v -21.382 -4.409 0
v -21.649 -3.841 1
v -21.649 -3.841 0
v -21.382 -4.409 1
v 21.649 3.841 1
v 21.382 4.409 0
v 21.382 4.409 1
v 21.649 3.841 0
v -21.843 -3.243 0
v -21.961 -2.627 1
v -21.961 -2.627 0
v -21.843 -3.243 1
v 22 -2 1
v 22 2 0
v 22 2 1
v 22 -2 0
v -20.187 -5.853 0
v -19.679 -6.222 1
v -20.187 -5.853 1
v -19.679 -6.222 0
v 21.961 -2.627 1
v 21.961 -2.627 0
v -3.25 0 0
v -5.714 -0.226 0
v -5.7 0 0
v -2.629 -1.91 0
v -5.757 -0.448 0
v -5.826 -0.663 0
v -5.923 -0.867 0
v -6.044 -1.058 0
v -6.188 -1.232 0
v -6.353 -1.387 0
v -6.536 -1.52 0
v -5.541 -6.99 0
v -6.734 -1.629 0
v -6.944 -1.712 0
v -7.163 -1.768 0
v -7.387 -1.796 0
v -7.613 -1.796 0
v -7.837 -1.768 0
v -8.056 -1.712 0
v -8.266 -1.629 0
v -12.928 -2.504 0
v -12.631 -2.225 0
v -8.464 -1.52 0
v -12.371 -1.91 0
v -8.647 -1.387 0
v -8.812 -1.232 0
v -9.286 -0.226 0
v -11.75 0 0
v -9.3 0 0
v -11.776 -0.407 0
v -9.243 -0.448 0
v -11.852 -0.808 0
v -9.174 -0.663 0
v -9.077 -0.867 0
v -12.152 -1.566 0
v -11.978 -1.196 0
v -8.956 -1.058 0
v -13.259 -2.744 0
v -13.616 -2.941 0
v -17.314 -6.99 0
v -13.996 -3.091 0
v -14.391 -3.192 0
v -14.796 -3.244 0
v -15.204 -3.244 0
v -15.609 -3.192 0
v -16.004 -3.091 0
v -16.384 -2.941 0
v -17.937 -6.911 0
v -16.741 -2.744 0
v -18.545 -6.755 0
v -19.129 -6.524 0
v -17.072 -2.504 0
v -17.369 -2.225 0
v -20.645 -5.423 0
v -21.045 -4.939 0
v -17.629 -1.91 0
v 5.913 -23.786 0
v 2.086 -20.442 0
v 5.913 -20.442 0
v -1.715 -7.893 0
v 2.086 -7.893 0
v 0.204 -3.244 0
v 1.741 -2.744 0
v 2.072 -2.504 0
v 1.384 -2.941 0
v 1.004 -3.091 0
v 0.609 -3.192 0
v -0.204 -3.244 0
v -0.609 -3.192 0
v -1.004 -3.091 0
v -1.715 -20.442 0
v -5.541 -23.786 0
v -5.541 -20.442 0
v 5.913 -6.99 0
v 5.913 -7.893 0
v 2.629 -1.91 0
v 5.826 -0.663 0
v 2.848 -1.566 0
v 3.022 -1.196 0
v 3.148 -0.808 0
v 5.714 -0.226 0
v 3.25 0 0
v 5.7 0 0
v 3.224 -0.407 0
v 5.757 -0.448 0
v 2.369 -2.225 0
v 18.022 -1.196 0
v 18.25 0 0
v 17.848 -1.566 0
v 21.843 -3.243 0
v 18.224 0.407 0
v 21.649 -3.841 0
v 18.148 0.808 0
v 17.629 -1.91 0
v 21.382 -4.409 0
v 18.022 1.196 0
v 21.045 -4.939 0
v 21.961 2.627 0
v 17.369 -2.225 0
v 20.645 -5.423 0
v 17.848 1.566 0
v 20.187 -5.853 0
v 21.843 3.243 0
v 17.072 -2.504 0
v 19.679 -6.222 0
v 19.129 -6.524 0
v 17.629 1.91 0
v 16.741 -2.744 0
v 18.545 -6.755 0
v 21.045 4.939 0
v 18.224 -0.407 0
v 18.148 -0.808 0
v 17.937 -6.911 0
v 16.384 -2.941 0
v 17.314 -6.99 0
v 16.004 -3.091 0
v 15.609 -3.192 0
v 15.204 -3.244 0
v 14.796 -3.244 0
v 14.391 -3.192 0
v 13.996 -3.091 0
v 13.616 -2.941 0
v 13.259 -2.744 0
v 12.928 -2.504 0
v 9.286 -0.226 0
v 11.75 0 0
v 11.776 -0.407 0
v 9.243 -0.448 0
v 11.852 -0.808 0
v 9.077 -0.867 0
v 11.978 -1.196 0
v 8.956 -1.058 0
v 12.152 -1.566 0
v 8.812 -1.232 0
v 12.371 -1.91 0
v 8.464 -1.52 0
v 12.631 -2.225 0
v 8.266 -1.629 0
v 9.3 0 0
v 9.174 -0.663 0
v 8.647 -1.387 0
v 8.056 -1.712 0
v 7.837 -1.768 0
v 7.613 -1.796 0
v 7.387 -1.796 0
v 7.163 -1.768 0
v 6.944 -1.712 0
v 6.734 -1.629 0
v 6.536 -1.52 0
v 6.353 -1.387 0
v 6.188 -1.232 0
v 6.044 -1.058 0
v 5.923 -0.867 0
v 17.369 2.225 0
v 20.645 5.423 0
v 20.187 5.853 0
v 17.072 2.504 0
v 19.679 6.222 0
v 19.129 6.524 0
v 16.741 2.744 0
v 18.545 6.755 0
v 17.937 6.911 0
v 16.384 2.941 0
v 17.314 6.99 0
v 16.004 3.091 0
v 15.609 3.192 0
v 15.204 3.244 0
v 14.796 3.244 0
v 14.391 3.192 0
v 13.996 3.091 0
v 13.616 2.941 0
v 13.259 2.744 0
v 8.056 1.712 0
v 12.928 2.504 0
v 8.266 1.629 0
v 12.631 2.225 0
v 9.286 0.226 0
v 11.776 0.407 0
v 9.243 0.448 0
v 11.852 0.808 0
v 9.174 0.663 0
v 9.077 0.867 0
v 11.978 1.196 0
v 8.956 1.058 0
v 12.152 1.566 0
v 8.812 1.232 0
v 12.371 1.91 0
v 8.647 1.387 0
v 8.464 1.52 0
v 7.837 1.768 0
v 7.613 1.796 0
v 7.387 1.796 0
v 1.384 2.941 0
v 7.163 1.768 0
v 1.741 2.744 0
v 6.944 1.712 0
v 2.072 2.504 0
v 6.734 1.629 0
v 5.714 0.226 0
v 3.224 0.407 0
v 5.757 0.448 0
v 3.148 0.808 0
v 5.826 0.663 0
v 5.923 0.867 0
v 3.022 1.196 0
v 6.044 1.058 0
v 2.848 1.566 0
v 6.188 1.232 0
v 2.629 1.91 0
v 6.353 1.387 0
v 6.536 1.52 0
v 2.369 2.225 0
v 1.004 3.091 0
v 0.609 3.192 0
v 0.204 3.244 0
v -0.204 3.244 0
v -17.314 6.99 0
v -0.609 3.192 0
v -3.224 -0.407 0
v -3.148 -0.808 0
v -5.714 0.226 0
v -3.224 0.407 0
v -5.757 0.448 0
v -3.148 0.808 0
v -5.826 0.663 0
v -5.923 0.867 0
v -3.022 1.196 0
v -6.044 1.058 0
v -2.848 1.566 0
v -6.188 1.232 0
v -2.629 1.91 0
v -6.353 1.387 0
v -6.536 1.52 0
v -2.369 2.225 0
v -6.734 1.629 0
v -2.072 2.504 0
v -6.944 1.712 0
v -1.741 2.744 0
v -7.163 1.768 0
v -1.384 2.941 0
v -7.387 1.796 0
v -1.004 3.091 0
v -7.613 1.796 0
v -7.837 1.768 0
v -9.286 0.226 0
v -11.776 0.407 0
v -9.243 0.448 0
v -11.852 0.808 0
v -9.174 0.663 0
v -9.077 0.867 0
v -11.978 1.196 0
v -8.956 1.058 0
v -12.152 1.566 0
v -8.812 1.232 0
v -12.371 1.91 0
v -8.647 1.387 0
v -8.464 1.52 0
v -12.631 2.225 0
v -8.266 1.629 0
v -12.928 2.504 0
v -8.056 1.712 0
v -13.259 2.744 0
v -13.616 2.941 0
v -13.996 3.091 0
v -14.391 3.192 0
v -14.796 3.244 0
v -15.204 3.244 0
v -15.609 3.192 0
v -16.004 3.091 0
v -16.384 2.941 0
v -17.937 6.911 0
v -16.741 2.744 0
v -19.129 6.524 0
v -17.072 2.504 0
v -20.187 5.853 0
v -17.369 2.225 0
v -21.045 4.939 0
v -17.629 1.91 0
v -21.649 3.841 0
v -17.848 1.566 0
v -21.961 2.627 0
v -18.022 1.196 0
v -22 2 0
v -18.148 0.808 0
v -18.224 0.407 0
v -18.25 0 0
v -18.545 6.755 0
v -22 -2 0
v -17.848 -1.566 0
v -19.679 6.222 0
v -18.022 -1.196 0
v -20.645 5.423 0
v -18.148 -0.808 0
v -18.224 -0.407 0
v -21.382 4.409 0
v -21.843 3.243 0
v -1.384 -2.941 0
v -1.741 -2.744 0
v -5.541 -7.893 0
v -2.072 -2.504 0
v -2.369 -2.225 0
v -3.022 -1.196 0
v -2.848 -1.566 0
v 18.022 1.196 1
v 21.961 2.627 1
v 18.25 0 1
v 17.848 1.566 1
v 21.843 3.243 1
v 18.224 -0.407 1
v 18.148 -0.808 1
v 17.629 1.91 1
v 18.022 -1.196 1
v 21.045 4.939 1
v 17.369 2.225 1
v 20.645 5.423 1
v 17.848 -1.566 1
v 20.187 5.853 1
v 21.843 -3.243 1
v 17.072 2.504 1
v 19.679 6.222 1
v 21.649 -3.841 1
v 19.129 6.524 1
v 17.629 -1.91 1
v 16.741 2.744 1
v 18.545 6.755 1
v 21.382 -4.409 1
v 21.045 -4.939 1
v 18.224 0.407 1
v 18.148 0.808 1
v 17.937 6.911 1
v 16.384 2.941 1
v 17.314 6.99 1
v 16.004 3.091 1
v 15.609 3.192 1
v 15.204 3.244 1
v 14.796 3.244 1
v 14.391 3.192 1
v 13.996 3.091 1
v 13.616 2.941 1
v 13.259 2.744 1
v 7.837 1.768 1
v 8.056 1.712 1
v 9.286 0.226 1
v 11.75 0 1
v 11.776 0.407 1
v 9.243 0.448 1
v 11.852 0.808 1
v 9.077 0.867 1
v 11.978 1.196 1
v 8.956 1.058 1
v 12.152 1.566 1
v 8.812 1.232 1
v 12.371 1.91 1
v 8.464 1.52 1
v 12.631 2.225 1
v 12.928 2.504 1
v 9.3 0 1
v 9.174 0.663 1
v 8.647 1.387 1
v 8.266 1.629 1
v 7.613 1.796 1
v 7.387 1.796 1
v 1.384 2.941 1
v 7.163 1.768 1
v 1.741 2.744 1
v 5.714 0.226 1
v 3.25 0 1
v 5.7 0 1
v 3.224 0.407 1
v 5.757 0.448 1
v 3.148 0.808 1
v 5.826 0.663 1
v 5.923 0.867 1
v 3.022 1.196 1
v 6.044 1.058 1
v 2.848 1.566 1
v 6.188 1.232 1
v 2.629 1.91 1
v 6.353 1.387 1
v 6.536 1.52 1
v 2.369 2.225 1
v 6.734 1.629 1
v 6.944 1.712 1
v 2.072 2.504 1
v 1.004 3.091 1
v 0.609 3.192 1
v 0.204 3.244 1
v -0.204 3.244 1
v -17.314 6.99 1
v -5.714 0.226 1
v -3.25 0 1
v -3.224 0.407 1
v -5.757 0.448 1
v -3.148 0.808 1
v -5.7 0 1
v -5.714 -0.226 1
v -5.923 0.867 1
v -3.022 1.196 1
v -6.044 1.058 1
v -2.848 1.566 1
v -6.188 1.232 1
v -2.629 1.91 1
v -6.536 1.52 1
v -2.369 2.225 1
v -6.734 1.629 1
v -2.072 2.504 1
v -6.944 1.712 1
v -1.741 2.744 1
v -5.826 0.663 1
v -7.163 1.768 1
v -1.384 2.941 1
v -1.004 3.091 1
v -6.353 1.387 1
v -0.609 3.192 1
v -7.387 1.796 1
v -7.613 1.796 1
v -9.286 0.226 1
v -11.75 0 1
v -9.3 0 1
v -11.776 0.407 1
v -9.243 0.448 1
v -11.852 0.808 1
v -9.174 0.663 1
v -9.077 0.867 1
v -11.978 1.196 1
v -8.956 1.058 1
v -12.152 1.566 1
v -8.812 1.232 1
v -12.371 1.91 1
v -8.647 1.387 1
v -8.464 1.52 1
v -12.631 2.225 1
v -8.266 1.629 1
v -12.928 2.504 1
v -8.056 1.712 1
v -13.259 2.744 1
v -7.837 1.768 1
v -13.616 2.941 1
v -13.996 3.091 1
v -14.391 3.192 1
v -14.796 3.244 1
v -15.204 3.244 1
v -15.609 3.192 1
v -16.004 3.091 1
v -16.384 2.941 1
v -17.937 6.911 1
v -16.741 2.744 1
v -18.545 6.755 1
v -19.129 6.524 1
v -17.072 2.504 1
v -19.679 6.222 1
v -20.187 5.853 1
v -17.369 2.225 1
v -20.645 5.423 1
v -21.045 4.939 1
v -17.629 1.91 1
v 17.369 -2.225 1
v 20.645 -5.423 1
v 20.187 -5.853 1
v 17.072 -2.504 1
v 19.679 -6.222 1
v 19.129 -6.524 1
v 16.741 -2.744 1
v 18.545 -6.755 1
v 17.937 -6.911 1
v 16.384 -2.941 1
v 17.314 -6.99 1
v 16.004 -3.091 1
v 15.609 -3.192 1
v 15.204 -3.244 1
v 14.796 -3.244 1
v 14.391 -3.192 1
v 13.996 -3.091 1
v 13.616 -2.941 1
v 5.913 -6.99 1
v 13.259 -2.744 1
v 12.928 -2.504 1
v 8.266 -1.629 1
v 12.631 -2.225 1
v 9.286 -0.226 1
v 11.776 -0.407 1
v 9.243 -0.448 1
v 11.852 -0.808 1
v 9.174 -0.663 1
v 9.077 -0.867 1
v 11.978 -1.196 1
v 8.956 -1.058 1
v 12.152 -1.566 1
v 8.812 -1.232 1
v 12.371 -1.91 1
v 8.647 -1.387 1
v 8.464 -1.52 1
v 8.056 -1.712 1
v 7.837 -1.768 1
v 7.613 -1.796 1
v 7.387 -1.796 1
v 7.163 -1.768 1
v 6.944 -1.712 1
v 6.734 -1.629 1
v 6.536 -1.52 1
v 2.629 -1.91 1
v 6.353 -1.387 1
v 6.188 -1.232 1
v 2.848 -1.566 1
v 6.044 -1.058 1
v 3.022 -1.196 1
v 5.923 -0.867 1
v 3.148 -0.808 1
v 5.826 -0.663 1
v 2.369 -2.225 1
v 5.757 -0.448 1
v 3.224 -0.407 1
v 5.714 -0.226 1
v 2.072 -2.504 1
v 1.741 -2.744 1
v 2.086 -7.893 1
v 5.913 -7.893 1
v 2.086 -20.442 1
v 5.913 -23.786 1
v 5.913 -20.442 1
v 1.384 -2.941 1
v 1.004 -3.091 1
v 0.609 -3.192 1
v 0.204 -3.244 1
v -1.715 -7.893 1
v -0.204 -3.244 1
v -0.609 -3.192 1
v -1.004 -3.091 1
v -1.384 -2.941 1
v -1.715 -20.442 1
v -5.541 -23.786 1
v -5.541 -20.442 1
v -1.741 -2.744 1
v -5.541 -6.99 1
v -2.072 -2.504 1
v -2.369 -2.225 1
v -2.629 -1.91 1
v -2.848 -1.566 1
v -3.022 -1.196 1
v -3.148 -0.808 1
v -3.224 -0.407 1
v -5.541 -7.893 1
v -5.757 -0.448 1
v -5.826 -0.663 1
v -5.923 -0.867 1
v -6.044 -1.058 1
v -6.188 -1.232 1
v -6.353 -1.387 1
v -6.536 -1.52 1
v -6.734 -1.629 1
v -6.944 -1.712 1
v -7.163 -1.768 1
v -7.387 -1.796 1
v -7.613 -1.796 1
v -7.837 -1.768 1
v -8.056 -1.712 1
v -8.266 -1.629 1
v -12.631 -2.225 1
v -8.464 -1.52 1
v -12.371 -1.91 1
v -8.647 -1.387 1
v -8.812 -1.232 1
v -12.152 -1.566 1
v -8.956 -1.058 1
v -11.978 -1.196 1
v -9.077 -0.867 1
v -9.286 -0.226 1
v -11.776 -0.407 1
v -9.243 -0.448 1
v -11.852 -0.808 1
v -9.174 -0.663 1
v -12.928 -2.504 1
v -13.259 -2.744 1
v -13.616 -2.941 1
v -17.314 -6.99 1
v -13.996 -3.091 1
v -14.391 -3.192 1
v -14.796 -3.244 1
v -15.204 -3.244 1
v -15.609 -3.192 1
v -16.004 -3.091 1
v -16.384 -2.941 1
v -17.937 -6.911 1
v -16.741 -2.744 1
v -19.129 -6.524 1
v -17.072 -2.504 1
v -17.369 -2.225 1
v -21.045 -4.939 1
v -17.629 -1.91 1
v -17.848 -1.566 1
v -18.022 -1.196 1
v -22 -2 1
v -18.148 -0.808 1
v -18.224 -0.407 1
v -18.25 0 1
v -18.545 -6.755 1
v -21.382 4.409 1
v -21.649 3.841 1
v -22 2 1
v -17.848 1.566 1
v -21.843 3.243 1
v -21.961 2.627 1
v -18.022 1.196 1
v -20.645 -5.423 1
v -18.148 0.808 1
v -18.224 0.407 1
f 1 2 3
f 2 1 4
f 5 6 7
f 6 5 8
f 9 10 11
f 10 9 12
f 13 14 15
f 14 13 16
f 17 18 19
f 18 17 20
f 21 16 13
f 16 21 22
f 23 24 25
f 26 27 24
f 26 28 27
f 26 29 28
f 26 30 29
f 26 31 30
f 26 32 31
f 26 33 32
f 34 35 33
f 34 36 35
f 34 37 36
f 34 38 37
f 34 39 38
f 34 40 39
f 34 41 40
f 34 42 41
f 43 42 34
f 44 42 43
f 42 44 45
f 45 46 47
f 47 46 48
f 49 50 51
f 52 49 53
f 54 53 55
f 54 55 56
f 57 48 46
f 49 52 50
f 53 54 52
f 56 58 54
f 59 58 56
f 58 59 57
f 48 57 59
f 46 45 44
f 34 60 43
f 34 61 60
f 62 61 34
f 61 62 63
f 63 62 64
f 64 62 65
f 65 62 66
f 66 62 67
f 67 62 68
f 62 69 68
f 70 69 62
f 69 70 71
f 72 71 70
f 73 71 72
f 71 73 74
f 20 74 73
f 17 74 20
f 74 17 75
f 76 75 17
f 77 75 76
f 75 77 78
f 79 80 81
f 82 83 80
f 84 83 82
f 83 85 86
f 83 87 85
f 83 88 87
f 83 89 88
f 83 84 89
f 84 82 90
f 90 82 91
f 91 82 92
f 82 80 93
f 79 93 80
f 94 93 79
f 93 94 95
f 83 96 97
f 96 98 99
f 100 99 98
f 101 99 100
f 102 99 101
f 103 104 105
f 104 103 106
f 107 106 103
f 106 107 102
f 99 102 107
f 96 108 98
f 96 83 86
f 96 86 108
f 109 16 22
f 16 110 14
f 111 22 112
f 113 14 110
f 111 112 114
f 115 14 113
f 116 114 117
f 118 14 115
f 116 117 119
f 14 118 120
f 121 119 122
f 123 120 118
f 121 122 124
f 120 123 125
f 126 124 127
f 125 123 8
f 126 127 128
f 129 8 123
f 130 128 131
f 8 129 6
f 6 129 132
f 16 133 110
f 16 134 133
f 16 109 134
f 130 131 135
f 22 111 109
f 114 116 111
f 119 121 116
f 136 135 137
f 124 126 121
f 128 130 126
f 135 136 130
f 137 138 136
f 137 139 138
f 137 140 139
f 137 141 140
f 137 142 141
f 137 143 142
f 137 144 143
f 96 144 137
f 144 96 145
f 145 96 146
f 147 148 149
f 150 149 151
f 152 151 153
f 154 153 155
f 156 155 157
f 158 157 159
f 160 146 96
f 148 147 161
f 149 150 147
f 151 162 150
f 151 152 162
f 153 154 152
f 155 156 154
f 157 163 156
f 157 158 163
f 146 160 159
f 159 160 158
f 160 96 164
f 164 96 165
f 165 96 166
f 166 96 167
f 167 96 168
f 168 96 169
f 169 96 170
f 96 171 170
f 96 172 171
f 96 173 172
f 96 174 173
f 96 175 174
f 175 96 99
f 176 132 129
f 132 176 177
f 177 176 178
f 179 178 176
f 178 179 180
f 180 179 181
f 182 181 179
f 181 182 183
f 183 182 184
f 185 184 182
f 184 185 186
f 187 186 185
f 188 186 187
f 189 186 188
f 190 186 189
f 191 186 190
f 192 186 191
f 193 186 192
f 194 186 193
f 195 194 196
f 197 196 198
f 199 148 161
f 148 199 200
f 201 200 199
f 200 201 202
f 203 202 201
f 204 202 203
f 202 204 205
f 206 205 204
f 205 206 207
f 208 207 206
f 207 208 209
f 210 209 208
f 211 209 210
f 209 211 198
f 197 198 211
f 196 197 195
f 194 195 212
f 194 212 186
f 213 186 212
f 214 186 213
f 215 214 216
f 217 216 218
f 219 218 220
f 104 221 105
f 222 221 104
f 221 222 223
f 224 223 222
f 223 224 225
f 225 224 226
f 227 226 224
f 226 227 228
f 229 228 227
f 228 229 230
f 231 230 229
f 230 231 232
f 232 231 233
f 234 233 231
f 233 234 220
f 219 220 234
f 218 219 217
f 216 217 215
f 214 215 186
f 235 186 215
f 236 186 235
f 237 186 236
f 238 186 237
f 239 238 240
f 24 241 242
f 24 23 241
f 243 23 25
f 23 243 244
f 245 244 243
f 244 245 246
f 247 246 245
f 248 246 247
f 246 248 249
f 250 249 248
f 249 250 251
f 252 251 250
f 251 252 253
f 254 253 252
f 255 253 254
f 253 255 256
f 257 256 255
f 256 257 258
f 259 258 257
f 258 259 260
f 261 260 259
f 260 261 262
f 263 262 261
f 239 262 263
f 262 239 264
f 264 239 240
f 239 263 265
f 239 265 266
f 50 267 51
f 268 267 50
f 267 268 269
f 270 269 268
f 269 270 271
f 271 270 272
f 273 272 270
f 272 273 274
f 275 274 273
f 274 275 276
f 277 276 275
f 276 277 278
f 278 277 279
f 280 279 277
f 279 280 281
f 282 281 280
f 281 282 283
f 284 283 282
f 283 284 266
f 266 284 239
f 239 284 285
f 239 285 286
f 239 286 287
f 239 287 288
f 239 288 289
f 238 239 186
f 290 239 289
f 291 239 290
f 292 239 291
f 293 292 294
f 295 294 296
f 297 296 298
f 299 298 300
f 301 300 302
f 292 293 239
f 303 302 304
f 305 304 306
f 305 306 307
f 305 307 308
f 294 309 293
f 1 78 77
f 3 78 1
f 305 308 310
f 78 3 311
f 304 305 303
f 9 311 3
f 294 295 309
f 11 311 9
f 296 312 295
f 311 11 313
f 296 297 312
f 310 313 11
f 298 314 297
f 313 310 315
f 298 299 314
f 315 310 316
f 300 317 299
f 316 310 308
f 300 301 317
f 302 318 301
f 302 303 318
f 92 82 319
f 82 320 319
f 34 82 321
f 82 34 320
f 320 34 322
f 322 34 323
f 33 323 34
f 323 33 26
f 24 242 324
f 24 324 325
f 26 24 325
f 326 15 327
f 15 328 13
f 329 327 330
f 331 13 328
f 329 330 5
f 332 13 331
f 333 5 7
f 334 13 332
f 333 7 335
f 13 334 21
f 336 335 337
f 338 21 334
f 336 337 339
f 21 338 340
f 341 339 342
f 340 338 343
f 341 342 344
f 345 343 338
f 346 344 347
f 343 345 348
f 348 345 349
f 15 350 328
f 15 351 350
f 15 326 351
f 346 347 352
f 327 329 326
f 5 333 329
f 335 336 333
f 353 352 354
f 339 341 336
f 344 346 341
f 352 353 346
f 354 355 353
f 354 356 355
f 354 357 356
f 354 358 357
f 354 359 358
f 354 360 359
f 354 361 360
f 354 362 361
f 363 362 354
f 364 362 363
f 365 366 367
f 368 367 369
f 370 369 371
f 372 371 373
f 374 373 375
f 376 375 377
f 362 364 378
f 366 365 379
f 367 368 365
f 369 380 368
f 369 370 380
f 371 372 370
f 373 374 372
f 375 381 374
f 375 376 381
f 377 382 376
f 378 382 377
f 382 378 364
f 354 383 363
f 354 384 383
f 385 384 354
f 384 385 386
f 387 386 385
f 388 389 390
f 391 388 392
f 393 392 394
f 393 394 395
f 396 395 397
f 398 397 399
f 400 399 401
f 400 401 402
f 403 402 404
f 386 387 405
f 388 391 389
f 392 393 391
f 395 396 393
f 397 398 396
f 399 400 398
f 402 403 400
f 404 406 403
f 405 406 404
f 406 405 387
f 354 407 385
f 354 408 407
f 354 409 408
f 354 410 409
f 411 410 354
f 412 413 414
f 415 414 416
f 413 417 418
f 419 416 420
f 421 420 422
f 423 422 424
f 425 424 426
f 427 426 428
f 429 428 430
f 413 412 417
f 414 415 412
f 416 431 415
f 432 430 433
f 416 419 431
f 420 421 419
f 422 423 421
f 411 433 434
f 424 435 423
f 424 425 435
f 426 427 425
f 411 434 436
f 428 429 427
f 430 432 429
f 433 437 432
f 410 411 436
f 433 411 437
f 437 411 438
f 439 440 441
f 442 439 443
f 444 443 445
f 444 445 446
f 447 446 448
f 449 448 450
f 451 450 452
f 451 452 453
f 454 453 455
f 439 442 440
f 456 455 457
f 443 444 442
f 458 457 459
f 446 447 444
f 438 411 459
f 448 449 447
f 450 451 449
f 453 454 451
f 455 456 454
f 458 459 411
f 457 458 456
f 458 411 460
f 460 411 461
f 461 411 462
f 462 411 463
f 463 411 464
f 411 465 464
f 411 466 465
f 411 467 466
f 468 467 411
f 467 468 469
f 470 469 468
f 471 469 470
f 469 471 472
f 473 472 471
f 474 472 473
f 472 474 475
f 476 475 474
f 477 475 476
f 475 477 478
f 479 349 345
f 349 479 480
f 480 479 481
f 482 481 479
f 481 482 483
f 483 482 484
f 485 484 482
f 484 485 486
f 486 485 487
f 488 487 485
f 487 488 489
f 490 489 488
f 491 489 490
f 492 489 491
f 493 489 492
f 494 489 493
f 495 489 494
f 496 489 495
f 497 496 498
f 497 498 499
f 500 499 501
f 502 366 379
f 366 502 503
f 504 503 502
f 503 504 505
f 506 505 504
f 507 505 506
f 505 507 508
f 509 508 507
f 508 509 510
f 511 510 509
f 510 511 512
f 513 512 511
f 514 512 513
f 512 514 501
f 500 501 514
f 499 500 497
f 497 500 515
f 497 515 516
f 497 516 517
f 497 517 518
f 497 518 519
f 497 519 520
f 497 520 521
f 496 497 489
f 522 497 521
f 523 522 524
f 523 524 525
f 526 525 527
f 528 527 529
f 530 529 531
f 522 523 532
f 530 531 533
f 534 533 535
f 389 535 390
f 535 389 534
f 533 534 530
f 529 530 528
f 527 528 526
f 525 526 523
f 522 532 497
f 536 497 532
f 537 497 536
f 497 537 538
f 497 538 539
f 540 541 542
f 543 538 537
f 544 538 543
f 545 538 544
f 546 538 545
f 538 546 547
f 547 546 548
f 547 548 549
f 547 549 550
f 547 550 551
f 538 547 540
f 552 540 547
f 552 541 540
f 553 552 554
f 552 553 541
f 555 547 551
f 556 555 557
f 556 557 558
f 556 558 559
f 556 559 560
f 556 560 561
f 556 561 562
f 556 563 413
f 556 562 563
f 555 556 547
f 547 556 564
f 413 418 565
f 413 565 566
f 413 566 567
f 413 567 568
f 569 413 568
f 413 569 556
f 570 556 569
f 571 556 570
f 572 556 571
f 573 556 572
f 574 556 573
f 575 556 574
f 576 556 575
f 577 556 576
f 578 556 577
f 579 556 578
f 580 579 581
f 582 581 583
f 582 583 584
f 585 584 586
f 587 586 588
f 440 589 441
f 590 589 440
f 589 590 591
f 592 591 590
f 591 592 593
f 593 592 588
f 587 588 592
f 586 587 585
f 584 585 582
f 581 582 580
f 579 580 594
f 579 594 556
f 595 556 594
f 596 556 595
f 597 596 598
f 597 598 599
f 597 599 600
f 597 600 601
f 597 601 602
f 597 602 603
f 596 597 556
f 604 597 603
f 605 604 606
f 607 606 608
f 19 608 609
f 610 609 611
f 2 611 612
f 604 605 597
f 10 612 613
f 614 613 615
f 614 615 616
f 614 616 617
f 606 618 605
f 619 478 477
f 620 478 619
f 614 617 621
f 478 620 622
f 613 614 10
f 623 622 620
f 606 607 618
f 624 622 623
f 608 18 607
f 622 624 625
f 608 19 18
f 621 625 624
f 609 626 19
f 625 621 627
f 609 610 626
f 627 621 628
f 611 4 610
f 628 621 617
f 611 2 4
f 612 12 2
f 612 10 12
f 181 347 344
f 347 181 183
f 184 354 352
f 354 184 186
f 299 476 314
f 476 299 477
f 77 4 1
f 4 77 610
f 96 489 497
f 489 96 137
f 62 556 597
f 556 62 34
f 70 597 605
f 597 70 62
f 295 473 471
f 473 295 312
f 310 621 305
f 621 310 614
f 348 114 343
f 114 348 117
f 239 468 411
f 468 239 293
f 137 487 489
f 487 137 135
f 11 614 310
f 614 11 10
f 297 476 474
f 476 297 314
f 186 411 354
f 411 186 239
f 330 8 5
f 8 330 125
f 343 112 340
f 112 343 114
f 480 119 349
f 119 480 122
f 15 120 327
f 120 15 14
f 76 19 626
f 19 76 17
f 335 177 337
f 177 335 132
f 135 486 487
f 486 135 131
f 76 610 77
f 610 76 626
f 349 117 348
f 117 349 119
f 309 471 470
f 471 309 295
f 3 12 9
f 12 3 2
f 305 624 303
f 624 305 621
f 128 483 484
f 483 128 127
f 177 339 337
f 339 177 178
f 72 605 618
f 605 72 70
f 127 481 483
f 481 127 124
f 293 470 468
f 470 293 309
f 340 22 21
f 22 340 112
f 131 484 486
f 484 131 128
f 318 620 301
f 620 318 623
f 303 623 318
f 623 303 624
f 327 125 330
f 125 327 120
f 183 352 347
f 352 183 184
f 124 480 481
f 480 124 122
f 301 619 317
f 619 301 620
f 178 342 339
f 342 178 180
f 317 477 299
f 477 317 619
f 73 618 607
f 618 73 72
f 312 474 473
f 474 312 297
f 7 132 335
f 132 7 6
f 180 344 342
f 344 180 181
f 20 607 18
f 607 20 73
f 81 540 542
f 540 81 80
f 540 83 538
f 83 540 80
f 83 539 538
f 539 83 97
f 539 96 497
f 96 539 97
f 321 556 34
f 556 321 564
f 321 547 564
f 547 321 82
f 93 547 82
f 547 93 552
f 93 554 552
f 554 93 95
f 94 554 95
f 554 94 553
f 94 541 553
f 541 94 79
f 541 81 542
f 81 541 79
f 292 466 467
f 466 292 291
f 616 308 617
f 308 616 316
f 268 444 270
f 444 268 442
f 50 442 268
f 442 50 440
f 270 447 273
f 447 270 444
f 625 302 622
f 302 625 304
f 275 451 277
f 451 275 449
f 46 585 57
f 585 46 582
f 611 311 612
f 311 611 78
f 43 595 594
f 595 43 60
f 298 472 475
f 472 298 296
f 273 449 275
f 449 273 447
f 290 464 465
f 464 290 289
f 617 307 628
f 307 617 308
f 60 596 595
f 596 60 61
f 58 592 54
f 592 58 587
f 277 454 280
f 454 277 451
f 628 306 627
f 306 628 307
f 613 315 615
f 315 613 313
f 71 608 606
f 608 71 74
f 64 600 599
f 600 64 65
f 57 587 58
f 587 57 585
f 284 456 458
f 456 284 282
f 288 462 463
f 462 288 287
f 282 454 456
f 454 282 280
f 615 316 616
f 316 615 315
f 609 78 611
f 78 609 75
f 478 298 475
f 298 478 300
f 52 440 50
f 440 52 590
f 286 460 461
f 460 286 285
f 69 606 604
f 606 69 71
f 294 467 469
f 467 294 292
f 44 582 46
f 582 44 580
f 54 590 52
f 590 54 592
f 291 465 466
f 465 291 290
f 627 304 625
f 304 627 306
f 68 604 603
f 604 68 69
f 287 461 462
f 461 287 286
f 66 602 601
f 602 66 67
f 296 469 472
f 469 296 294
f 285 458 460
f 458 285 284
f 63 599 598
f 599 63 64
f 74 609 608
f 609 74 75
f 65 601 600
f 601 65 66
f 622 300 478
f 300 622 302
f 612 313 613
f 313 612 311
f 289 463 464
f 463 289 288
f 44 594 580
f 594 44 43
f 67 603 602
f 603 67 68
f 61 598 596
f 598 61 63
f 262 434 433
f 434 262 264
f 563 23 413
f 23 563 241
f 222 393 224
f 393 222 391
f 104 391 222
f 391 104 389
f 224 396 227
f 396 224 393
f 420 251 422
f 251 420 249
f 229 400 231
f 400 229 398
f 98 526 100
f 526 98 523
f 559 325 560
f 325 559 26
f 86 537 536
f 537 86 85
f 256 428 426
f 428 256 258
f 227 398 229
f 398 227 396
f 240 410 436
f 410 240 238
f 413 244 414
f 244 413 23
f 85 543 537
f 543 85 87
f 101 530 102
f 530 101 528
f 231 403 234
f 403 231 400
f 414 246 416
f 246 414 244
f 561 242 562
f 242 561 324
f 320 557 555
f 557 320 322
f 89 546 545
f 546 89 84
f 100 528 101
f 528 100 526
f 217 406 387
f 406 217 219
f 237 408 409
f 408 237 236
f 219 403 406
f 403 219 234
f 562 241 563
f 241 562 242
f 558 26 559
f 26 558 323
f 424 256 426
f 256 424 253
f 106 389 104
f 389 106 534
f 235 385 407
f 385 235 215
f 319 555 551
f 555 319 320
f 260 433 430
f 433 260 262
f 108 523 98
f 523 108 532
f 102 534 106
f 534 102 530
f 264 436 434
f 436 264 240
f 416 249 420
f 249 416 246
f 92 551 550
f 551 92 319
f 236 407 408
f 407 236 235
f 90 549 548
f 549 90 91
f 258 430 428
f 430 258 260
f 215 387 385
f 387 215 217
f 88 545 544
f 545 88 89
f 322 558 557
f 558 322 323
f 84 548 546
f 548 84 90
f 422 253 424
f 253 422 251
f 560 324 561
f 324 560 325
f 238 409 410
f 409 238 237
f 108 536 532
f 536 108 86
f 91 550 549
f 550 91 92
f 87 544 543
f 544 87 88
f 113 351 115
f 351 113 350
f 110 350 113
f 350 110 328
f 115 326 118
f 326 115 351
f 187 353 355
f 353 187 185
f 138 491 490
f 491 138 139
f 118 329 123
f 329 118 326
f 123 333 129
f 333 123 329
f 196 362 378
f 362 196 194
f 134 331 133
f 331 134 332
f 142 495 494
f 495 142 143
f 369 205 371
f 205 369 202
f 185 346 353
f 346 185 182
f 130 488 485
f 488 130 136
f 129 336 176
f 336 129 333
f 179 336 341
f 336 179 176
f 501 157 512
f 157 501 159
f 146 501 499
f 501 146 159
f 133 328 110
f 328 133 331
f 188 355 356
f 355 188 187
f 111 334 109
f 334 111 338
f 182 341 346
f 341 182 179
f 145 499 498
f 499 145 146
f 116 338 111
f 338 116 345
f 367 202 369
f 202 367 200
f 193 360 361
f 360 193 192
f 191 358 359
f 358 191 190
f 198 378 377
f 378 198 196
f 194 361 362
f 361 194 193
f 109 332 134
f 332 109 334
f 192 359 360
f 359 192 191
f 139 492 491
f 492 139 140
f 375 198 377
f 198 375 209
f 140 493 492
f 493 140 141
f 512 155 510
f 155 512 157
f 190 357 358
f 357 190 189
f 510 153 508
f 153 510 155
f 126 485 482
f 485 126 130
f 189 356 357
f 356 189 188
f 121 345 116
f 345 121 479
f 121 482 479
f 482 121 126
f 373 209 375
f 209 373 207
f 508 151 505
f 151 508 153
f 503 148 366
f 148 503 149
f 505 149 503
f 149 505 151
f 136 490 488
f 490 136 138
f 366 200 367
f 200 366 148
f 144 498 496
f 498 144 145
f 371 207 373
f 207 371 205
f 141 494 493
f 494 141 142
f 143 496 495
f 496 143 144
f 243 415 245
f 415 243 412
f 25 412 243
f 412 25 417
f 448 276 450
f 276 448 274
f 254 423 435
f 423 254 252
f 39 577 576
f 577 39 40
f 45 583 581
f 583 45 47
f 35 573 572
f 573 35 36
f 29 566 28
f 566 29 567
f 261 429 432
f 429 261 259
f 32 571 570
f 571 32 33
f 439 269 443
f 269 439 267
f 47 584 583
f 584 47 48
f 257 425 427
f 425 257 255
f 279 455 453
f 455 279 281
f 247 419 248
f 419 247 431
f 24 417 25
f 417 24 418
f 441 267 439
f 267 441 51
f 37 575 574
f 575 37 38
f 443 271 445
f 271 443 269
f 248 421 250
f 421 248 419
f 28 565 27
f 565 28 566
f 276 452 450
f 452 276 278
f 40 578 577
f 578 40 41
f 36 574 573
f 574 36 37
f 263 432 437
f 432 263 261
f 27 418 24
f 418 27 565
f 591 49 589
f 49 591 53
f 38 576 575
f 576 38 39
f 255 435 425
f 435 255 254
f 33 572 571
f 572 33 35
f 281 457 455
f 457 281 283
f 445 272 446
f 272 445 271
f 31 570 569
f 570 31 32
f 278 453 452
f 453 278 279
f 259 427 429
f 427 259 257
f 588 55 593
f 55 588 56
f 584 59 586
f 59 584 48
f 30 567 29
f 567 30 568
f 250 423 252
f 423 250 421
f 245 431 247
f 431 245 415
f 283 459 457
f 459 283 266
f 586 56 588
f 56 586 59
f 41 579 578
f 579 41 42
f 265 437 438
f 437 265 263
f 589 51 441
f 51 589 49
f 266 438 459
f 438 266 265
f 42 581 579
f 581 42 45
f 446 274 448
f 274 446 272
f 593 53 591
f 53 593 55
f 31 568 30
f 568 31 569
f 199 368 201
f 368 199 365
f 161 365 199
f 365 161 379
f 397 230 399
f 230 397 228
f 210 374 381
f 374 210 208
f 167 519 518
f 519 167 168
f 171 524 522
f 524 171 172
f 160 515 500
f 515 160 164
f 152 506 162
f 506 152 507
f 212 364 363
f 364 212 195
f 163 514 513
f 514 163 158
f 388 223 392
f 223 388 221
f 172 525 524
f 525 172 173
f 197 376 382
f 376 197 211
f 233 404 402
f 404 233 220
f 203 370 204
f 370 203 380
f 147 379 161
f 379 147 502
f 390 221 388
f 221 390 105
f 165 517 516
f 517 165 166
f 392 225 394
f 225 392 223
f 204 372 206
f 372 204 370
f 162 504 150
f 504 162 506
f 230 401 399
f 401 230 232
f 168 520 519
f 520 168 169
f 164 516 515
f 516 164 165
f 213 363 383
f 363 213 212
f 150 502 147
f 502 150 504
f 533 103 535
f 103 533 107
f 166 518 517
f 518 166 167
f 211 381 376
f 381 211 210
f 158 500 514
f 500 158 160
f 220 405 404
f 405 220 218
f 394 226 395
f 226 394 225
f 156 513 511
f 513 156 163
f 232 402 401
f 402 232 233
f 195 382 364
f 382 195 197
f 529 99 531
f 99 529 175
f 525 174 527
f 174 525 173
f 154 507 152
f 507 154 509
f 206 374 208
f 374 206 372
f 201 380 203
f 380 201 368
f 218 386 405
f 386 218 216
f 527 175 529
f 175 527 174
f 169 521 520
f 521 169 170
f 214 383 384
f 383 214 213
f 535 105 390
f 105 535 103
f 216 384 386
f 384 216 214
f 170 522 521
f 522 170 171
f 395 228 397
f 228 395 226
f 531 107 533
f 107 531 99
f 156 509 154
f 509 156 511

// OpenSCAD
$fn = 50;


difference() {
	union() {
		*color(alpha = 1.0000000000, c = "gray") {
			translate(v = [0, 14, 0]) {
				linear_extrude(height = 1) {
					text(font = "Arial:style=Bold", halign = "center", size = 4.5000000000, text = "COMMENT description oobb_plate_shape_p_type_1_depth_3_width_1_thickness_i_extra_oobb_size", valign = "center");
				}
			}
		}
		hull() {
			translate(v = [-17.0000000000, 2.0000000000, 0]) {
				cylinder(h = 1, r = 5);
			}
			translate(v = [17.0000000000, 2.0000000000, 0]) {
				cylinder(h = 1, r = 5);
			}
			translate(v = [-17.0000000000, -2.0000000000, 0]) {
				cylinder(h = 1, r = 5);
			}
			translate(v = [17.0000000000, -2.0000000000, 0]) {
				cylinder(h = 1, r = 5);
			}
		}
		translate(v = [0, -5, 0]) {
			linear_extrude(height = 1) {
				text(font = "DejaVu Sans Mono:style=Bold", halign = "center", size = 19.0000000000, text = "I", valign = "top");
			}
		}
	}
	union() {
		*color(alpha = 1.0000000000, c = "gray") {
			translate(v = [0, 14, 0]) {
				linear_extrude(height = 1) {
					text(font = "Arial:style=Bold", halign = "center", size = 4.5000000000, text = "COMMENT description oobb_holes_shape_n_type_3_width_1_thickness_i_extra_oobb_size_1_height_'all'_holes_true_both_holes", valign = "center");
				}
			}
		}
		translate(v = [-15.0000000000, 0.0000000000, 0]) {
			translate(v = [0, 0, -50]) {
				cylinder(h = 100, r = 3.2500000000);
			}
		}
		translate(v = [0, 0, -50]) {
			cylinder(h = 100, r = 3.2500000000);
		}
		translate(v = [15.0000000000, 0.0000000000, 0]) {
			translate(v = [0, 0, -50]) {
				cylinder(h = 100, r = 3.2500000000);
			}
		}
		translate(v = [-15.0000000000, 0.0000000000, 0]) {
			translate(v = [0, 0, -50]) {
				cylinder(h = 100, r = 1.8000000000);
			}
		}
		translate(v = [-7.5000000000, 0.0000000000, 0]) {
			translate(v = [0, 0, -50]) {
				cylinder(h = 100, r = 1.8000000000);
			}
		}
		translate(v = [0, 0, -50]) {
			cylinder(h = 100, r = 1.8000000000);
		}
		translate(v = [7.5000000000, 0.0000000000, 0]) {
			translate(v = [0, 0, -50]) {
				cylinder(h = 100, r = 1.8000000000);
			}
		}
		translate(v = [15.0000000000, 0.0000000000, 0]) {
			translate(v = [0, 0, -50]) {
				cylinder(h = 100, r = 1.8000000000);
			}
		}
	}
}
